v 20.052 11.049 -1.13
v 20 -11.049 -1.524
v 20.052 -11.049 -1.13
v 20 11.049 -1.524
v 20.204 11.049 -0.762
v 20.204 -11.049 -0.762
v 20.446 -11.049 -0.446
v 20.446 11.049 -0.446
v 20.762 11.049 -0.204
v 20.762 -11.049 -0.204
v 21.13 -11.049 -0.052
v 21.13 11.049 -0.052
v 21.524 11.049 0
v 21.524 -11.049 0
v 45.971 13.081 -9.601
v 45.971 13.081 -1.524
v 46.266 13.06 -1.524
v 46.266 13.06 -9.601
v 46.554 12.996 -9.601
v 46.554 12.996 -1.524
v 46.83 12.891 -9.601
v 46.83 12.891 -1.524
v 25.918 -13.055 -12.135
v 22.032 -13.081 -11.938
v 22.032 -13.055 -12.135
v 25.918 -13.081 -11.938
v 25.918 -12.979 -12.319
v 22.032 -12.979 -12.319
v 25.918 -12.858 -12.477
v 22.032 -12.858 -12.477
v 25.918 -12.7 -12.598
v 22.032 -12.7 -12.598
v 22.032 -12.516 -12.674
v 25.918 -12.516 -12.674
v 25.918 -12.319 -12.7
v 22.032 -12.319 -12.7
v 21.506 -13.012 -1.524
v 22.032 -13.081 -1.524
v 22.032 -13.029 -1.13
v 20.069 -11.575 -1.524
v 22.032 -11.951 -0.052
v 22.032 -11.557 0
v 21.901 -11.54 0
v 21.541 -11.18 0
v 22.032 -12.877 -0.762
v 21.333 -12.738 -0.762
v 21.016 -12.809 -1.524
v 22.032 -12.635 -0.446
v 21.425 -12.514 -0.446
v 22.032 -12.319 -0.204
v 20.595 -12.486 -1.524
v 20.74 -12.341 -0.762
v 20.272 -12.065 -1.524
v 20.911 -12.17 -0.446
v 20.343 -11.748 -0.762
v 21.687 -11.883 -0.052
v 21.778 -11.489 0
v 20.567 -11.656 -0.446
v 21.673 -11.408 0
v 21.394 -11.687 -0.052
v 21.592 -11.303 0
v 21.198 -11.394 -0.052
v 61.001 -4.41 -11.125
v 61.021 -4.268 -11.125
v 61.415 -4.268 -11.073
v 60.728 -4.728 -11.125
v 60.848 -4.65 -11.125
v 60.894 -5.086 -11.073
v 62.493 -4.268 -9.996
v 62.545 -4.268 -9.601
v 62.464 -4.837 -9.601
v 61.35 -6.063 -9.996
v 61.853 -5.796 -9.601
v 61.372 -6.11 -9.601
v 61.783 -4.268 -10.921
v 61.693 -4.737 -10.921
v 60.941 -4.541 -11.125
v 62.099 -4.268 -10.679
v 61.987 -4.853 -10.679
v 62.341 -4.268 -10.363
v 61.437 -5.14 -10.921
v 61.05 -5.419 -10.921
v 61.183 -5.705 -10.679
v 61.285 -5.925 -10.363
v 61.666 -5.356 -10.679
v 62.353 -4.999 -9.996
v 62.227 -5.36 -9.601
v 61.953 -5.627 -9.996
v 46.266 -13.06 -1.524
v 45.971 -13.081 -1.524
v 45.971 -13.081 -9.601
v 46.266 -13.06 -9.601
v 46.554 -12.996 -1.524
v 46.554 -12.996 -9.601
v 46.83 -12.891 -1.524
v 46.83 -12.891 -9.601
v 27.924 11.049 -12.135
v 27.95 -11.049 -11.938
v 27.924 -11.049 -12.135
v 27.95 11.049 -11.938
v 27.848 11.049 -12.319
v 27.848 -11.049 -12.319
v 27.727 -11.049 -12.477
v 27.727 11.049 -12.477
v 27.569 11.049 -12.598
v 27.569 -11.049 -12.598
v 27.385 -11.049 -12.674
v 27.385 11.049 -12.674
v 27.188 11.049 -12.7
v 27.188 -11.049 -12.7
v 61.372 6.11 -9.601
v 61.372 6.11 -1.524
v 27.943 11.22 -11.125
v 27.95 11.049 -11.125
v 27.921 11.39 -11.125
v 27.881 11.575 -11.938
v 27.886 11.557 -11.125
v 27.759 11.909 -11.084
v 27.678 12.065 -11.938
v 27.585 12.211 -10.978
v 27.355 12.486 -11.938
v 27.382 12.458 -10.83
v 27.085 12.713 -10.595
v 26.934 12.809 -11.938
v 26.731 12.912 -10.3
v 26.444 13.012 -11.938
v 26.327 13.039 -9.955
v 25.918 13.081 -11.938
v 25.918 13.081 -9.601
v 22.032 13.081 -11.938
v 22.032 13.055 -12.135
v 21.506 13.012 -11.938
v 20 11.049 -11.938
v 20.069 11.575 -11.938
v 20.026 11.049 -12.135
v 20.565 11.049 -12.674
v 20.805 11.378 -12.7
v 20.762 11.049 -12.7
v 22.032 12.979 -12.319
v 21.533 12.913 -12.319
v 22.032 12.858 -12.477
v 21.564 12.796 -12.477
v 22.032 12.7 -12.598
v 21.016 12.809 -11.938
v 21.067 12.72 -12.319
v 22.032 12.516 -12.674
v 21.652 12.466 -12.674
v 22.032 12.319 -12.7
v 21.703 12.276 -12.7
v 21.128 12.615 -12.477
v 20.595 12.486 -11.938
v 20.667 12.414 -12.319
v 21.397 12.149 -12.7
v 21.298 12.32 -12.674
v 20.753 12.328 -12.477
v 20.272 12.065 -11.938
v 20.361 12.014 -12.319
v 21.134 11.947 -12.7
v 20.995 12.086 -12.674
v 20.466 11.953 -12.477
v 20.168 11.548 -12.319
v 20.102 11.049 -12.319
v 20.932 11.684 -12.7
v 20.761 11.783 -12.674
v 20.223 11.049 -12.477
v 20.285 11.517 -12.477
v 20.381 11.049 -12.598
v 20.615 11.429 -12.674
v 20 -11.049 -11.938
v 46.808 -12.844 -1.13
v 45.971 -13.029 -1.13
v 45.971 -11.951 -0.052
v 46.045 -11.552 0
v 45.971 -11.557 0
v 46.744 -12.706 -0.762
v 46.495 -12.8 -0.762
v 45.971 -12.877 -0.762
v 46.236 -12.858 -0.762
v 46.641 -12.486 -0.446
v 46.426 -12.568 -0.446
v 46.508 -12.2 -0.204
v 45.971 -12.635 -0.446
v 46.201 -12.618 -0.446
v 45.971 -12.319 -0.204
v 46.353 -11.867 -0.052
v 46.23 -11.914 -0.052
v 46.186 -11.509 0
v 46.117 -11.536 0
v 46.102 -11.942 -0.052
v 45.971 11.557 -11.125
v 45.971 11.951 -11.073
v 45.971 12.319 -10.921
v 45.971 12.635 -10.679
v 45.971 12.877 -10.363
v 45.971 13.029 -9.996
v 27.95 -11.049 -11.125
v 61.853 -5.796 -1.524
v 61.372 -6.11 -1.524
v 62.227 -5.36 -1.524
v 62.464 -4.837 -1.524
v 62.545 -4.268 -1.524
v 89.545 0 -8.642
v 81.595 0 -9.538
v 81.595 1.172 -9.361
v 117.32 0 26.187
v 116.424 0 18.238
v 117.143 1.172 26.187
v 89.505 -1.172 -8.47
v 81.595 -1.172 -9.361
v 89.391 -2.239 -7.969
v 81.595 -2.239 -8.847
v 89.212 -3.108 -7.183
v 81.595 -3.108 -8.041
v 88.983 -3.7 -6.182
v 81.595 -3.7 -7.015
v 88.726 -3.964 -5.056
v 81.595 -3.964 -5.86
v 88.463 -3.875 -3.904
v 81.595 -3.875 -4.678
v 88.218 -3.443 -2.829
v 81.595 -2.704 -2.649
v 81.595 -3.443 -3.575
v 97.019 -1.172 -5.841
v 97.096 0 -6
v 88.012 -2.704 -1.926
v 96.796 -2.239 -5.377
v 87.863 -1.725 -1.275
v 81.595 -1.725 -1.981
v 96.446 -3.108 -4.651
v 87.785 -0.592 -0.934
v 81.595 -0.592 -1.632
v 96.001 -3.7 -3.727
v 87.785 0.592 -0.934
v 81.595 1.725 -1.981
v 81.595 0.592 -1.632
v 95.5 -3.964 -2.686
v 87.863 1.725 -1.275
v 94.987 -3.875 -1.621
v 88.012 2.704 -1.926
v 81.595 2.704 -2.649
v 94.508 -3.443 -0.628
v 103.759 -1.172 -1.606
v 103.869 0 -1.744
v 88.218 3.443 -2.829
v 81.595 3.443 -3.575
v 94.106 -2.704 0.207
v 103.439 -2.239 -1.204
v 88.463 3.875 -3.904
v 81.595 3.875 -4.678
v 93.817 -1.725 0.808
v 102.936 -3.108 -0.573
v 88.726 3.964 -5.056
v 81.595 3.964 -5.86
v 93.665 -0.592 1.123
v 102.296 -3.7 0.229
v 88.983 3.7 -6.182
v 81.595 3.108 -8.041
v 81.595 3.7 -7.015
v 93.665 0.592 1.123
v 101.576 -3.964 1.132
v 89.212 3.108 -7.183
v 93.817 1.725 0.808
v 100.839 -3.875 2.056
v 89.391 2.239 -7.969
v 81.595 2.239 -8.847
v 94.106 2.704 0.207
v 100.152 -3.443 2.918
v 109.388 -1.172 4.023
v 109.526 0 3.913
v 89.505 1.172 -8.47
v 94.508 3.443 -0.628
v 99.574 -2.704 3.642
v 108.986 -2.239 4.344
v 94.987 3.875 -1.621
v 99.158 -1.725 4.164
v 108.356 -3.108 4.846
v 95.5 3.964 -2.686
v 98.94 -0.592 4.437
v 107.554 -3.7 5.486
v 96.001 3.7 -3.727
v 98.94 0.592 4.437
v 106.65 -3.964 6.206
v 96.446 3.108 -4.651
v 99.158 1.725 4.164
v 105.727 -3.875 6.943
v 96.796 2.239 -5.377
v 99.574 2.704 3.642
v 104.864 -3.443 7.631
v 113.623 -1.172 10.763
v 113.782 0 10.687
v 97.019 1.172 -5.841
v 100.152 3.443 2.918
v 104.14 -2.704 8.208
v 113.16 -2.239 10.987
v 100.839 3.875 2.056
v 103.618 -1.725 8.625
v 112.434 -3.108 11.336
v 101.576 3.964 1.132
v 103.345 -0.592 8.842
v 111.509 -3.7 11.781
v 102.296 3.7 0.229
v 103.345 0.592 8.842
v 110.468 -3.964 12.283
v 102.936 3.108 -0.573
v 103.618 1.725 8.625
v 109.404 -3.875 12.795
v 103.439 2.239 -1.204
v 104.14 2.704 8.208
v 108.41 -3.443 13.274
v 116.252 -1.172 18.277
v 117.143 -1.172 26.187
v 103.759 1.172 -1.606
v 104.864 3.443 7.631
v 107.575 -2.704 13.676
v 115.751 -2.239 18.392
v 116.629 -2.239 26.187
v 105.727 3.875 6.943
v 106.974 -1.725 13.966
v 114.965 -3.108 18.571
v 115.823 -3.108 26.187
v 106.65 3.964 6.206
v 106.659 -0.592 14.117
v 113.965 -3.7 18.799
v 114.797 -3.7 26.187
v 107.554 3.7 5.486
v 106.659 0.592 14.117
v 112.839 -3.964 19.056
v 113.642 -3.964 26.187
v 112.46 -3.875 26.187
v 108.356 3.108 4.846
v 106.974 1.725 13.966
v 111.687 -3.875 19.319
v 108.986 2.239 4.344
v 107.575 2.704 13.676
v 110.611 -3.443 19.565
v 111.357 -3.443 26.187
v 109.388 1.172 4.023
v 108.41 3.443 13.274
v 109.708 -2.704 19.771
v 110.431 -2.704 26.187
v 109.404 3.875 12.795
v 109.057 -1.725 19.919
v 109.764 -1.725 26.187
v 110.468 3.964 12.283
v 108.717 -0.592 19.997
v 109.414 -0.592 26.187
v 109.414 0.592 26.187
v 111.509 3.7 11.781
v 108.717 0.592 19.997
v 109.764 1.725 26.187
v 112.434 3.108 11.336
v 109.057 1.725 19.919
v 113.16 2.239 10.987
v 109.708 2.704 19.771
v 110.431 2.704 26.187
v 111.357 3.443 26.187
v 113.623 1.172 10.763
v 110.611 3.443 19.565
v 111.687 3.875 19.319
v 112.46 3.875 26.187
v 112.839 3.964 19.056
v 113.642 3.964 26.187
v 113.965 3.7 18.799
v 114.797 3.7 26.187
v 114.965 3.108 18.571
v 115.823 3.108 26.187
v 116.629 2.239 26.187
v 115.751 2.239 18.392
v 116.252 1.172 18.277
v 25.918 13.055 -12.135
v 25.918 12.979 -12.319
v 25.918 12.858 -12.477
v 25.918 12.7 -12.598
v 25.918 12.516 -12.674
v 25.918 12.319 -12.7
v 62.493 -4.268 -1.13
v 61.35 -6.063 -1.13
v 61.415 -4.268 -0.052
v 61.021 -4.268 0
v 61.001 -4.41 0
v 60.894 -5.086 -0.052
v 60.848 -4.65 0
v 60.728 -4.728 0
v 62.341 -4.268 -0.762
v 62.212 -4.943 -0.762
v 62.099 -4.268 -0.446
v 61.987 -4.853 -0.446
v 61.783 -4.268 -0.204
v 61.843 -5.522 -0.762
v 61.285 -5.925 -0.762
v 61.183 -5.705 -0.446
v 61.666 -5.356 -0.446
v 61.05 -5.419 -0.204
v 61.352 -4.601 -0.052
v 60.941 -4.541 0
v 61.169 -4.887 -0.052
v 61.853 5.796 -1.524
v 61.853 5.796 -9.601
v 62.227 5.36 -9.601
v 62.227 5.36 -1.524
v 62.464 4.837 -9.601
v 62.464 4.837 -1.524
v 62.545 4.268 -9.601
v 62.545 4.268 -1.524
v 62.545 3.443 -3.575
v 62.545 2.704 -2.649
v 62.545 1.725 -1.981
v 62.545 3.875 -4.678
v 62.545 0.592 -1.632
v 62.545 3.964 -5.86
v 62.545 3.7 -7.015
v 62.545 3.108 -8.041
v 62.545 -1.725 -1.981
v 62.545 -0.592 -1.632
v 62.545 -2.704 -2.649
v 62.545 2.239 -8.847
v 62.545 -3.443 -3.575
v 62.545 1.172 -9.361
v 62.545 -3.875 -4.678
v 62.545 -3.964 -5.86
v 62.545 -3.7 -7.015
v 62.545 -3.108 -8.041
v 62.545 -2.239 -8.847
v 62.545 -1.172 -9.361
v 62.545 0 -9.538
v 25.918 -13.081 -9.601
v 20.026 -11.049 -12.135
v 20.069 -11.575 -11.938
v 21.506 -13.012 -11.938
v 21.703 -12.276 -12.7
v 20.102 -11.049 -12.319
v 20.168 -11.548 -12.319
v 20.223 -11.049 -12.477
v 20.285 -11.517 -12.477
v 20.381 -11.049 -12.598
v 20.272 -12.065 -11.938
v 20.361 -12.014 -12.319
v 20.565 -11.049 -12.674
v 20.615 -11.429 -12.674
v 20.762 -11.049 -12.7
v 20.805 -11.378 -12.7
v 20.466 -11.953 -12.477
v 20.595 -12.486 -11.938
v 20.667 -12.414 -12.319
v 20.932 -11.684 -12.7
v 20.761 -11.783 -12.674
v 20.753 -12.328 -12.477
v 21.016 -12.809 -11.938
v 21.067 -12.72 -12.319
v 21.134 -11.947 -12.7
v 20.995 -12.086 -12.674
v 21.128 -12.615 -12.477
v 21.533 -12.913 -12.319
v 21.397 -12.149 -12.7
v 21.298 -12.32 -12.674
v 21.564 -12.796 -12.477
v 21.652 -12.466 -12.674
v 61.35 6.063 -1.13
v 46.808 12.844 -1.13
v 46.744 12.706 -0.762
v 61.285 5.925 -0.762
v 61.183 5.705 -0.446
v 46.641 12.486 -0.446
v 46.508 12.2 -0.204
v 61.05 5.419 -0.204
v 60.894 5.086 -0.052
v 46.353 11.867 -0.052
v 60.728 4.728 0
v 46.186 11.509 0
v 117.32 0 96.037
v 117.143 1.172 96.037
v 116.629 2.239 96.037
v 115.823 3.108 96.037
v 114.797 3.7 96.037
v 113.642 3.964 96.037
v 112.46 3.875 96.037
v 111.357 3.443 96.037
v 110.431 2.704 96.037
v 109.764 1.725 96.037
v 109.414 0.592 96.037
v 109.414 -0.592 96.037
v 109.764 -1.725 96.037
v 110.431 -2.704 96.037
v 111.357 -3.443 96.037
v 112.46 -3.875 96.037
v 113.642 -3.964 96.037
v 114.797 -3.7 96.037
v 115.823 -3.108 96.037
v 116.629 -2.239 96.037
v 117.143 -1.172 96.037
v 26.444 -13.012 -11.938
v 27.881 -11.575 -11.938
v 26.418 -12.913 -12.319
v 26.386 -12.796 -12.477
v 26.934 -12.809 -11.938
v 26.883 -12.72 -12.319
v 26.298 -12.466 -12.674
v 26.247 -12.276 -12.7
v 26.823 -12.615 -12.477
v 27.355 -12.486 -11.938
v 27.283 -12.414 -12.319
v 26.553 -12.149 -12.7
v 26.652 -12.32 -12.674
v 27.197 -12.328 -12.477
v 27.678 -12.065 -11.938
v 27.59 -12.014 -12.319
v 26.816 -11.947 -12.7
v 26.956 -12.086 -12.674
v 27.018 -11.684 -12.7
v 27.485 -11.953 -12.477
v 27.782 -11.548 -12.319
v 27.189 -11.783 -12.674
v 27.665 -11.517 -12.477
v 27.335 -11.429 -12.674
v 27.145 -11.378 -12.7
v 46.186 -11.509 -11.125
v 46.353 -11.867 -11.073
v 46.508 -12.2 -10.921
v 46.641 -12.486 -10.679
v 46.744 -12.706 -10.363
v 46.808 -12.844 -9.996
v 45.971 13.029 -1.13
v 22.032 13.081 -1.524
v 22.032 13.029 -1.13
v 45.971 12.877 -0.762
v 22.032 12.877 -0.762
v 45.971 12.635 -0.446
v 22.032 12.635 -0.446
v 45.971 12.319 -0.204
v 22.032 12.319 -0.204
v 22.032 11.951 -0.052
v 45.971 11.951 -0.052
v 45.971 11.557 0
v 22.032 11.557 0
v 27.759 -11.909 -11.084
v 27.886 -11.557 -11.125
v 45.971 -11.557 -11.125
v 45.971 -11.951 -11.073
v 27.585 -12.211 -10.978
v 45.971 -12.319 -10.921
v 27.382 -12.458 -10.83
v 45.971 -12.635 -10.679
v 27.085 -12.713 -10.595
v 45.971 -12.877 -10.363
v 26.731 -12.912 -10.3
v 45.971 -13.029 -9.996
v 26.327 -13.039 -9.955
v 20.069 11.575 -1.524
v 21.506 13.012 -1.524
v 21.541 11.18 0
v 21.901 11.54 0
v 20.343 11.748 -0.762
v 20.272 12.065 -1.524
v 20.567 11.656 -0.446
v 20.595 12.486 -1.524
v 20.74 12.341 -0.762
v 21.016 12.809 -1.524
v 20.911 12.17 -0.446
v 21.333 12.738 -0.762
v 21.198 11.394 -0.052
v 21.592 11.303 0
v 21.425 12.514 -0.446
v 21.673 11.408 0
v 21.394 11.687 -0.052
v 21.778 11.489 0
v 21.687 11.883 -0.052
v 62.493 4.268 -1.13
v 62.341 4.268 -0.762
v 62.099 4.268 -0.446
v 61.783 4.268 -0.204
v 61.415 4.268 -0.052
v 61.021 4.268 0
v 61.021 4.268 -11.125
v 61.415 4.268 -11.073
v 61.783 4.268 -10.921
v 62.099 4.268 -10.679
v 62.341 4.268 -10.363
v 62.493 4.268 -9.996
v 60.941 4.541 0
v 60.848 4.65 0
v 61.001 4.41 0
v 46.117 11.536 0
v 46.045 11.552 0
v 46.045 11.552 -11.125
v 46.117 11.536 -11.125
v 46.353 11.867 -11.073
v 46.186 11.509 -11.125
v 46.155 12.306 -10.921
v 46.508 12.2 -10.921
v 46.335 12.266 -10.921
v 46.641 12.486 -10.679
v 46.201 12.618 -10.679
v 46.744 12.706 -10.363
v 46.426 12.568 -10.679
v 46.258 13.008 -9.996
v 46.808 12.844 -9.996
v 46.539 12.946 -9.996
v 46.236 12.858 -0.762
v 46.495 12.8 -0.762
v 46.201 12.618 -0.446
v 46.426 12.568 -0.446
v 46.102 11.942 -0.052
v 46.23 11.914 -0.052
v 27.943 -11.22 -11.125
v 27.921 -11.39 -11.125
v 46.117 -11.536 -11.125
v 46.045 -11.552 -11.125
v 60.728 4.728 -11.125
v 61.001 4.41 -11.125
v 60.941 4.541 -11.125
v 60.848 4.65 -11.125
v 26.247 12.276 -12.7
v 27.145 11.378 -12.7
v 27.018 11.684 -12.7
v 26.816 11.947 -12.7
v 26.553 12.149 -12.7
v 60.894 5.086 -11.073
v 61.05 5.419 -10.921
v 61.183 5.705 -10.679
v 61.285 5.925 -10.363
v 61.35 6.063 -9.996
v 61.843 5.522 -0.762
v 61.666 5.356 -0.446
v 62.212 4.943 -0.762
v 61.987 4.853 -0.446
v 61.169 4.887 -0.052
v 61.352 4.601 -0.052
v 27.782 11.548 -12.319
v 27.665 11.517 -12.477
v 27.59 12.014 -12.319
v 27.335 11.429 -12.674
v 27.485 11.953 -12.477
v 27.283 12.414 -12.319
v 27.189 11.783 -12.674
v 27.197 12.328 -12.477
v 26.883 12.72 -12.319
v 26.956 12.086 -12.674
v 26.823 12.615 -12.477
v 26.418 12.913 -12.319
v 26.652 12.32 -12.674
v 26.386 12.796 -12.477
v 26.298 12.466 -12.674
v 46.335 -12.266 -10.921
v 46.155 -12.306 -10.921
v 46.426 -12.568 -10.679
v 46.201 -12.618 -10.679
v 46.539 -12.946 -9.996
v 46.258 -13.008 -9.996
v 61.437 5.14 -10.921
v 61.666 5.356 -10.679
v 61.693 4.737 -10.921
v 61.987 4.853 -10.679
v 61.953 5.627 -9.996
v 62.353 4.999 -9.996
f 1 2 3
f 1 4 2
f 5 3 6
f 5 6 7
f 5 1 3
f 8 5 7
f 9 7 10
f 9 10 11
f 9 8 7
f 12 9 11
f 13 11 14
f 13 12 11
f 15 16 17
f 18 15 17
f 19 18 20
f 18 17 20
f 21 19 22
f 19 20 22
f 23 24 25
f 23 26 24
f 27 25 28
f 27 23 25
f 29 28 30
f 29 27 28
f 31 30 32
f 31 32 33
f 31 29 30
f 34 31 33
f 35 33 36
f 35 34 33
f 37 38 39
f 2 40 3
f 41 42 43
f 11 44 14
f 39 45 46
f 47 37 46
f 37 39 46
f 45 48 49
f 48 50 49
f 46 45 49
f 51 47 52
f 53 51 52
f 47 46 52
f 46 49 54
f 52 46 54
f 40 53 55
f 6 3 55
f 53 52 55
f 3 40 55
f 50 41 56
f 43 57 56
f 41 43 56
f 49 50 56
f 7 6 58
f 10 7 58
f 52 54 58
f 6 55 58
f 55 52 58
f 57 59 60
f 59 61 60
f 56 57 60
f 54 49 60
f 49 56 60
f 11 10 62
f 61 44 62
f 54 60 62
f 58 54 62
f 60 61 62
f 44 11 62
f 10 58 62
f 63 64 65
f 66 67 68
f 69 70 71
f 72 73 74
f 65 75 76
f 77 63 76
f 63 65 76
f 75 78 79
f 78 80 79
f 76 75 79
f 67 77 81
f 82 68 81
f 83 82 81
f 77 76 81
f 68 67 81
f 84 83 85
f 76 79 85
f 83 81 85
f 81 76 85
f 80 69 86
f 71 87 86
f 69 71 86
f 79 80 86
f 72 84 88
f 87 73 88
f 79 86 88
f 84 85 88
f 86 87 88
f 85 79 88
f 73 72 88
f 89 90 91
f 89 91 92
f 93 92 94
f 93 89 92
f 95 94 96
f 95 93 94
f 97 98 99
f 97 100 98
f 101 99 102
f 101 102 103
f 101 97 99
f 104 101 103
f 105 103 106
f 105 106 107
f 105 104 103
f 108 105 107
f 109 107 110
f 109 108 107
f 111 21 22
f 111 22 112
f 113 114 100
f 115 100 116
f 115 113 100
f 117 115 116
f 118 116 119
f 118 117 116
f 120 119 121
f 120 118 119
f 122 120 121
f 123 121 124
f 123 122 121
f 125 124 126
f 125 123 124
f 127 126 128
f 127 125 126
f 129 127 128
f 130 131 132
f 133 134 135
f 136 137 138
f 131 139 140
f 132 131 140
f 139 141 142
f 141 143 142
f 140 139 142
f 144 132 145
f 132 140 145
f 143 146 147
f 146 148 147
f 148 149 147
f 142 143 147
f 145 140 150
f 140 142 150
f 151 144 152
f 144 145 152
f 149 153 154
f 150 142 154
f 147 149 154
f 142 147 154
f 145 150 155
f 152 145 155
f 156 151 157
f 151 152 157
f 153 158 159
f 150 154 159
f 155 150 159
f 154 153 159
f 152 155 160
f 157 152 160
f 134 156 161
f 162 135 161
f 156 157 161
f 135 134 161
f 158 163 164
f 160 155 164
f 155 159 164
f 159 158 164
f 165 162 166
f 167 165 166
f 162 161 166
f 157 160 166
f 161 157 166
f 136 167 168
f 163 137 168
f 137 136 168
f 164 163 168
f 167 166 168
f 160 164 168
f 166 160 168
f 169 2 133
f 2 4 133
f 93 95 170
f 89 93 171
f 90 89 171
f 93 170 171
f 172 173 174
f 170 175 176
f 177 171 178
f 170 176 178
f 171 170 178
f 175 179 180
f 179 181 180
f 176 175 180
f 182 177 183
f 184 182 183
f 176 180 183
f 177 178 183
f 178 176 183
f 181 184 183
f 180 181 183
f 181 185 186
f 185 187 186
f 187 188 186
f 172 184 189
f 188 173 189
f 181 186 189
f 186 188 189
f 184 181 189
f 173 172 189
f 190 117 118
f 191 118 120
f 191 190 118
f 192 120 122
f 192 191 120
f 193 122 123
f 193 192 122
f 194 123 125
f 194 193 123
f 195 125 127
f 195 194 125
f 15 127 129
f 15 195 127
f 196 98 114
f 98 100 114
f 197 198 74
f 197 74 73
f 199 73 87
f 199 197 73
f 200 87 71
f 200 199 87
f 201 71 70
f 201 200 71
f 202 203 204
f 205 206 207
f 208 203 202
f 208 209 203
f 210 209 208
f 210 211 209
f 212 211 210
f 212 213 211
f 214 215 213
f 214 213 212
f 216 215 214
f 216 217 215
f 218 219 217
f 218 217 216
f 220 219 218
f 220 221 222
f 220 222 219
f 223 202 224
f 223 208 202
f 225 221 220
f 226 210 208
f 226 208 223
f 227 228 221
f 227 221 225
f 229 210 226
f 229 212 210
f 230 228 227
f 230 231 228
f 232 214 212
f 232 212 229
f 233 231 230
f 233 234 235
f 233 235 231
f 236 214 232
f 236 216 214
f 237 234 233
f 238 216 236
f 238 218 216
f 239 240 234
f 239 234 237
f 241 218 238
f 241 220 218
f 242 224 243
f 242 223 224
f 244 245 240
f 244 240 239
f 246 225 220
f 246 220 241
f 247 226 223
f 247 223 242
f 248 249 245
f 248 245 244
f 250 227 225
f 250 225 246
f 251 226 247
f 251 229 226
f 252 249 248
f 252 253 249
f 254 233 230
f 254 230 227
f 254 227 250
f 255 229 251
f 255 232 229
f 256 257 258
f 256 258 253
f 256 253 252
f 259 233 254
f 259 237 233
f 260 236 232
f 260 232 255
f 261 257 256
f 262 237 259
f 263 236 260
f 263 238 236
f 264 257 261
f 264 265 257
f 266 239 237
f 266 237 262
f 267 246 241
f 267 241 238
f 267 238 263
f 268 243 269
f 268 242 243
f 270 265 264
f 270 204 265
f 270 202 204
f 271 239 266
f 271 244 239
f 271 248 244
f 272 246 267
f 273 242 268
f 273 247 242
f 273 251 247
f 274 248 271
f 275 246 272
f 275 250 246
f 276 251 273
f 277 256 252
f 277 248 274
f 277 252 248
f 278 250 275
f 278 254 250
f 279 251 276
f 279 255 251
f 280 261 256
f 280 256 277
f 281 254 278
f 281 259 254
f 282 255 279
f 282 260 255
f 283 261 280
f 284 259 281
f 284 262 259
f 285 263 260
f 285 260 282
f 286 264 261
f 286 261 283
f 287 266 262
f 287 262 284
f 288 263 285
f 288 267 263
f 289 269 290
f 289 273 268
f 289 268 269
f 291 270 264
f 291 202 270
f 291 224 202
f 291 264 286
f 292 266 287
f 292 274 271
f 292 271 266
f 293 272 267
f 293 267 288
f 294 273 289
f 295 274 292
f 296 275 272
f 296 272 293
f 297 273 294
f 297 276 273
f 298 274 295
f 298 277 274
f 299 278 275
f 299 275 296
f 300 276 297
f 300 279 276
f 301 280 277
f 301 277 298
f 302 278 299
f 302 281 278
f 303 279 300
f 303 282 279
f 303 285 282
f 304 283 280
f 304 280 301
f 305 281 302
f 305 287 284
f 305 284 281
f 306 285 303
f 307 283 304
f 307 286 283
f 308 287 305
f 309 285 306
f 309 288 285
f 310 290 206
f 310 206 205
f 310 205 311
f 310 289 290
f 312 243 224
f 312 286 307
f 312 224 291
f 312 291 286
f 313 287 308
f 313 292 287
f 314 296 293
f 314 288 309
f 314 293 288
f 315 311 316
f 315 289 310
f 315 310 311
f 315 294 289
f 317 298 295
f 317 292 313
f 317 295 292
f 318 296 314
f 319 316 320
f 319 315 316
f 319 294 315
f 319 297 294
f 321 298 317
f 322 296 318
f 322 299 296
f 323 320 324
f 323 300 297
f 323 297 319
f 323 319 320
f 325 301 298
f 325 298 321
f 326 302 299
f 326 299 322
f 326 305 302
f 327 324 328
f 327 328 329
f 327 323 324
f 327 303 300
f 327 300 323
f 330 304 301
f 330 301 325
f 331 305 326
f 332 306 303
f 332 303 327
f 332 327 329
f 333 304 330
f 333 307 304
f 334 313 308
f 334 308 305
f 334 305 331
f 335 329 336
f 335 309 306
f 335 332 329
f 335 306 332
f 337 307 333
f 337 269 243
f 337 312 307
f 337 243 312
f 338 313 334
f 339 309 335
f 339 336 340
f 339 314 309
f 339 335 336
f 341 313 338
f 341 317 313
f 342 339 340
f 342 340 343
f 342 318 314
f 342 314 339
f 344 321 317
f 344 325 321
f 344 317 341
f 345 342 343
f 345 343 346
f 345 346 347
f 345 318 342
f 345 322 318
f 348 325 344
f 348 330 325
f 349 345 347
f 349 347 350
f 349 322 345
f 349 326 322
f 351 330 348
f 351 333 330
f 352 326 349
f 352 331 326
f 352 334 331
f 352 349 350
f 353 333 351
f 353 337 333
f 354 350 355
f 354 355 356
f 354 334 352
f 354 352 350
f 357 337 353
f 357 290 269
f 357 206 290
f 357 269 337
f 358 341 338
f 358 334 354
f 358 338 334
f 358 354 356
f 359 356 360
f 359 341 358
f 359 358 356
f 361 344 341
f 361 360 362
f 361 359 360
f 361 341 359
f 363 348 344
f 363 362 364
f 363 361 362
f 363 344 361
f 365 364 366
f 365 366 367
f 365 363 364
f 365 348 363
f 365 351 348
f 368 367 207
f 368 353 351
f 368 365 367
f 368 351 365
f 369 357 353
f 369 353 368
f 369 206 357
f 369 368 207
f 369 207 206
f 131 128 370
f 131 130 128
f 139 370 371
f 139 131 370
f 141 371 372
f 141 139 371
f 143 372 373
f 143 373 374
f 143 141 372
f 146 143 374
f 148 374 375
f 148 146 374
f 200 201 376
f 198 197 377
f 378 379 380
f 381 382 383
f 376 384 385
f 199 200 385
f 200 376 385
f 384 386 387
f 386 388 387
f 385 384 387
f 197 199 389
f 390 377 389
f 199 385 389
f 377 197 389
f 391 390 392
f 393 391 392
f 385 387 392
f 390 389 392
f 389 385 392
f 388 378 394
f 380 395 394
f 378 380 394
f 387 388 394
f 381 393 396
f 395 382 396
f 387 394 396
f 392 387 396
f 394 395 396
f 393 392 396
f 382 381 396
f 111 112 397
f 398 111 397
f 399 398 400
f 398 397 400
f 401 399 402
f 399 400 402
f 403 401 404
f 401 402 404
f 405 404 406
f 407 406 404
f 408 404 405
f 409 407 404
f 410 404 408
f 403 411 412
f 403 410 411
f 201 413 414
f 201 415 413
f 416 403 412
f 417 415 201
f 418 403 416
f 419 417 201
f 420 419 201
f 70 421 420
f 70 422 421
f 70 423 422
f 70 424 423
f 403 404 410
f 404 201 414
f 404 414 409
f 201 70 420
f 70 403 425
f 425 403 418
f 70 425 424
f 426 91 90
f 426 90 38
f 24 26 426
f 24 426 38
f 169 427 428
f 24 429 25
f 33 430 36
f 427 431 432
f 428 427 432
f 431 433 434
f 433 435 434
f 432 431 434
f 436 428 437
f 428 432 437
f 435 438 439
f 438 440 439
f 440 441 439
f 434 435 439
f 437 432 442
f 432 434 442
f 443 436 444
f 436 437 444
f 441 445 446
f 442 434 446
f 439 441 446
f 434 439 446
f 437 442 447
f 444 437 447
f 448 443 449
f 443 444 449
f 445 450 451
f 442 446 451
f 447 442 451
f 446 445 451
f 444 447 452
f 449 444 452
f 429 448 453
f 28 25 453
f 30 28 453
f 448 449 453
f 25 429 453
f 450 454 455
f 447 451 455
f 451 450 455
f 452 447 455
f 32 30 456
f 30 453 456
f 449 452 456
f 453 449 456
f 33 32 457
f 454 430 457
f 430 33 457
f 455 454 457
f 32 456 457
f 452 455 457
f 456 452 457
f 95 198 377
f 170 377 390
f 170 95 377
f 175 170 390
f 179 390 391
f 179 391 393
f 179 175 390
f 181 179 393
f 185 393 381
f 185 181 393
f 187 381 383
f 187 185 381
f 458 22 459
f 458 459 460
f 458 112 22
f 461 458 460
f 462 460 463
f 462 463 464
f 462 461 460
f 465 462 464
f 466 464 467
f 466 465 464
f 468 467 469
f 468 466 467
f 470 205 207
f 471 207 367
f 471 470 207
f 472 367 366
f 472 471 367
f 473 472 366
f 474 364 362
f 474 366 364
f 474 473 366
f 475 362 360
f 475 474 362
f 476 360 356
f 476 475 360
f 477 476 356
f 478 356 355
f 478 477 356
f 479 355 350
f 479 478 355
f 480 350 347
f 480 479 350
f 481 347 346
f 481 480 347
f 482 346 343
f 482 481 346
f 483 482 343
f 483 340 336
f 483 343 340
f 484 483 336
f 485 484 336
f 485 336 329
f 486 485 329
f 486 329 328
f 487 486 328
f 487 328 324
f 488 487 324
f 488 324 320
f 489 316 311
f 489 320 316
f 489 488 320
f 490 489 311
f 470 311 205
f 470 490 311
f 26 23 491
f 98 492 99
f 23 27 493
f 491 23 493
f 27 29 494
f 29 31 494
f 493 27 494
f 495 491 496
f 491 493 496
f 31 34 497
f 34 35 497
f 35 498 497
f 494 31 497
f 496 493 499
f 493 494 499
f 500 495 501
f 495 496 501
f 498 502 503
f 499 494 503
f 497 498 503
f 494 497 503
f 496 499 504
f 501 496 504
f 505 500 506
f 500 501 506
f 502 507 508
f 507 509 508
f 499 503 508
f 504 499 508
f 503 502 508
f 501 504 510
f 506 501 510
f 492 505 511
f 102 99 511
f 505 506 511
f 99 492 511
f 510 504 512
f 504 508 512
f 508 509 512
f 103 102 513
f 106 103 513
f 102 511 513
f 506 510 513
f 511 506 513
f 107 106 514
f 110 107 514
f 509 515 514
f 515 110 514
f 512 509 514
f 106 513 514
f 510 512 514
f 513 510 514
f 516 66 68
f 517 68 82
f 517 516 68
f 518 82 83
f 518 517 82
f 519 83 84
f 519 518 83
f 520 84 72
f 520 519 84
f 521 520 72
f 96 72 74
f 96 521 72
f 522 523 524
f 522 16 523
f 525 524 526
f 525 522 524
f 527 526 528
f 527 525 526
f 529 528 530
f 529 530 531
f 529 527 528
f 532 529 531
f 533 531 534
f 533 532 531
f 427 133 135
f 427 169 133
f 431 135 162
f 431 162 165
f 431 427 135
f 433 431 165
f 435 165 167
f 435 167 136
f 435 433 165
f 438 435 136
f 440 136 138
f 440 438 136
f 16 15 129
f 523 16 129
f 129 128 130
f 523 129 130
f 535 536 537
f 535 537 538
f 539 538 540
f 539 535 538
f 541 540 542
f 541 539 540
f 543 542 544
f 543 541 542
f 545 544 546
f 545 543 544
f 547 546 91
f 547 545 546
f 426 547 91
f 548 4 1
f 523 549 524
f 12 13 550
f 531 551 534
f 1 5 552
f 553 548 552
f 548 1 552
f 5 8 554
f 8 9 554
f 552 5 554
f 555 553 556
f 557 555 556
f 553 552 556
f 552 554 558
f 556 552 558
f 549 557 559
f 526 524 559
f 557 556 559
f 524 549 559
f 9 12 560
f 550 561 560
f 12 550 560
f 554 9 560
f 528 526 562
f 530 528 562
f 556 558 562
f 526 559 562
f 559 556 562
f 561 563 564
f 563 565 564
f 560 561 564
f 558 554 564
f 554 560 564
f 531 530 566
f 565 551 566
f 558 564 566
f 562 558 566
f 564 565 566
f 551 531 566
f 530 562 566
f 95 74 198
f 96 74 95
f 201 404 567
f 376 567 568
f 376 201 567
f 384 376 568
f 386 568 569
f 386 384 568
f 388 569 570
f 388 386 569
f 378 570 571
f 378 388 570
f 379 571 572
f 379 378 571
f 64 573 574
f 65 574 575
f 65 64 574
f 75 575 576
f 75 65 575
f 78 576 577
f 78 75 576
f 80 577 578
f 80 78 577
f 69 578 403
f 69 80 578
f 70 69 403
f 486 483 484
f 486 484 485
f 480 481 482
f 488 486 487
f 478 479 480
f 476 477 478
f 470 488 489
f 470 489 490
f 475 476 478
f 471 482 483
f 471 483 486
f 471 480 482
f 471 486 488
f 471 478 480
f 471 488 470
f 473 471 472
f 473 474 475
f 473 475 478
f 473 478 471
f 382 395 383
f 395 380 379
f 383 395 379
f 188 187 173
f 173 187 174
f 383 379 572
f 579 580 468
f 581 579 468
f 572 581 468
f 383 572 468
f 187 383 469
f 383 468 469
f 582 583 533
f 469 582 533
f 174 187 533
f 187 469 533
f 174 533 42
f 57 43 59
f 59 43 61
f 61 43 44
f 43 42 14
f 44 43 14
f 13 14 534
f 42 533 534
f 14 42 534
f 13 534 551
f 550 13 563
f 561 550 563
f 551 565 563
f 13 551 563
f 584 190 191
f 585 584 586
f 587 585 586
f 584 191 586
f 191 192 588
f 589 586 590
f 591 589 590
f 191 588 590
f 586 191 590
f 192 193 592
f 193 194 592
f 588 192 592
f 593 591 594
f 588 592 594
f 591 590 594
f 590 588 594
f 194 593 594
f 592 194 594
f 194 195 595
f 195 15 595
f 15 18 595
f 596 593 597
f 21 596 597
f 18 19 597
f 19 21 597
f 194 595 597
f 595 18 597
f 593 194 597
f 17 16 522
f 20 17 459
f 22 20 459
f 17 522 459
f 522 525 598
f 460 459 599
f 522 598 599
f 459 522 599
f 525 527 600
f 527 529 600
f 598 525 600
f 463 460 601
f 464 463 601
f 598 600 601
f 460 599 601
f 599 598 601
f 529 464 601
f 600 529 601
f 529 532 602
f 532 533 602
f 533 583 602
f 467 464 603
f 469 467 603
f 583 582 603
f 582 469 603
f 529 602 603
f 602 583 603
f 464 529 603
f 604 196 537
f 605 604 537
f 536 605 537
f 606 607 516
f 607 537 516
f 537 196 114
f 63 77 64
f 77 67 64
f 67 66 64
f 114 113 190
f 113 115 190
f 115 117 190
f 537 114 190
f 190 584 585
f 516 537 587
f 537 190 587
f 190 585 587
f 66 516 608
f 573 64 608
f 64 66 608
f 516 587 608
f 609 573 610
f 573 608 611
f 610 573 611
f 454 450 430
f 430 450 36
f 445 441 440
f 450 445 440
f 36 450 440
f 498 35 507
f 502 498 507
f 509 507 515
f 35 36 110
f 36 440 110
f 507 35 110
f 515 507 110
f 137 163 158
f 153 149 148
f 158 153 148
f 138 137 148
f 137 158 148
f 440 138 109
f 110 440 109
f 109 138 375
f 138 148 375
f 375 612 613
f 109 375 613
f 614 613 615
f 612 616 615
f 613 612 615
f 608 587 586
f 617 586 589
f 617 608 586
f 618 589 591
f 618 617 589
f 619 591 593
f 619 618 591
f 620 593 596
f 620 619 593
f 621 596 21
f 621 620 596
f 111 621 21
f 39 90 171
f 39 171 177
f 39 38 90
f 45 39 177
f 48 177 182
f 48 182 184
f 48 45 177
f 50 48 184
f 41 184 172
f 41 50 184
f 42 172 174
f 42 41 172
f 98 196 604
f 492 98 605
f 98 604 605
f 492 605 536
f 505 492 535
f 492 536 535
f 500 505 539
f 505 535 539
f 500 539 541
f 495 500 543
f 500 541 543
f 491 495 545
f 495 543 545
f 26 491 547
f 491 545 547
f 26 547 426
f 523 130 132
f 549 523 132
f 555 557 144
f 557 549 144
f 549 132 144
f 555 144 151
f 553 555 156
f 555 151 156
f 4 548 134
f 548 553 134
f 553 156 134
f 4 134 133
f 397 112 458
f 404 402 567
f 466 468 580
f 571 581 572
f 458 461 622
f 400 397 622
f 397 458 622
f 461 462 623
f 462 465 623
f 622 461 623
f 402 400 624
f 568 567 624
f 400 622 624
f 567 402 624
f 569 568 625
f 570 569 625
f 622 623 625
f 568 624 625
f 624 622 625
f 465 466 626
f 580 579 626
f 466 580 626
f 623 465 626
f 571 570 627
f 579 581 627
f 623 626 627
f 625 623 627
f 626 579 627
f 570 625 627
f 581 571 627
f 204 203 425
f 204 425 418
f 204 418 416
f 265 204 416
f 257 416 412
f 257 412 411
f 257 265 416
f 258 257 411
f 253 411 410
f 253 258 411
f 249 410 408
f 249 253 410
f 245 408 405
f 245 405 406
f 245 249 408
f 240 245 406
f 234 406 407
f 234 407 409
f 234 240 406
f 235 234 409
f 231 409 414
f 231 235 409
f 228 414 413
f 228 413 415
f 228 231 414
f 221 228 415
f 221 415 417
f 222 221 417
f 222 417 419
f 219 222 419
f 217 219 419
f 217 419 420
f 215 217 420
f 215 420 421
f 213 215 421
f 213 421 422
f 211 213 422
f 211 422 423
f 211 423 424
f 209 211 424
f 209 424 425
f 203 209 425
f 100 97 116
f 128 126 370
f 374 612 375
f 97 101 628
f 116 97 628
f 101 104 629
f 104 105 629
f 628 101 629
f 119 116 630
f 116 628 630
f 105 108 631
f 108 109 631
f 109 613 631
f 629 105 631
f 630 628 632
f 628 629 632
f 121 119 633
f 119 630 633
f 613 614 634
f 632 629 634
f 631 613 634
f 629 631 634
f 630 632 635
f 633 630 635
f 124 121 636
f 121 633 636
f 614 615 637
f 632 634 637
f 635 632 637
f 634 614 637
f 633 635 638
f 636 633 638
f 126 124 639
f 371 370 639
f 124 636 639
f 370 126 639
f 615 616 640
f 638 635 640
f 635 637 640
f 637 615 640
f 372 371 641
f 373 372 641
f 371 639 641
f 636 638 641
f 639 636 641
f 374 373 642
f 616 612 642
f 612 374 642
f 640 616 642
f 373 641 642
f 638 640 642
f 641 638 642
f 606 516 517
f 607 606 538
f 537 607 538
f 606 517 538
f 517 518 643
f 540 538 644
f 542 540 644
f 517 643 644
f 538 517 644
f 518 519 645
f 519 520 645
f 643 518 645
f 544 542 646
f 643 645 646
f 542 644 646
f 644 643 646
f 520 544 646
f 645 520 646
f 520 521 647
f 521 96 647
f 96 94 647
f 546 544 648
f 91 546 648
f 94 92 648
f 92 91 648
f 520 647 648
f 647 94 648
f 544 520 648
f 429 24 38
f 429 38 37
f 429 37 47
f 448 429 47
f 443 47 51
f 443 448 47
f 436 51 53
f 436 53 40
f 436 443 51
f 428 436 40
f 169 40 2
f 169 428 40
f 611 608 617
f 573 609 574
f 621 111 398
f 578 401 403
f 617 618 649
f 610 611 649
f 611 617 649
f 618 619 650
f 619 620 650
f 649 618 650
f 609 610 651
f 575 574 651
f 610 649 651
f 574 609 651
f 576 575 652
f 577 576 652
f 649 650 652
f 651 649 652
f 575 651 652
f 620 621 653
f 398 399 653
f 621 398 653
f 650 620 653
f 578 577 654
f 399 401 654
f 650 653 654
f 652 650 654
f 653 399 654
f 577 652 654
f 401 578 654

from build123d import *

# Parameters (mm, degrees)
BOSS_EXTRUDE1_DEPTH = 13.081
CUT_EXTRUDE1_START  = -11.1252
CUT_EXTRUDE1_DEPTH  = 11.1252
FILLET1_R           = 2.032
FILLET2_R           = 0.762
FILLET6_R           = 1.524
SKETCH6_R           = 3.9751


# Read off the part's stored shape, not the designer's step: Cut-Extrude1
with BuildPart() as part:
    # Sketch1 → Boss-Extrude1 (new, symmetric)
    with BuildSketch(Plane(origin=(0, 0, 0), x_dir=(1, 0, 0), z_dir=(0, 1, 0))):
        Polygon((27.9502, 12.7), (27.9502, 11.1252), (63.561, 11.1252), (63.561, 0), (20, 0), (20, 12.7), align=None)
    extrude(amount=BOSS_EXTRUDE1_DEPTH, both=True)

    # Cut-Extrude1 outline → Cut-Extrude1 (cut)
    with BuildSketch(Plane.XY.offset(CUT_EXTRUDE1_START)):
        Polygon((62.545, 5.5626), (62.545, -5.5626), (46.421739169, -13.081), (63.561, -13.081), (63.561, 13.081), (46.421739169, 13.081), align=None)
    extrude(amount=CUT_EXTRUDE1_DEPTH, mode=Mode.SUBTRACT)

    # Fillet1
    fillet1_edges = [part.edges().sort_by_distance(p)[0] for p in [
        (27.9502, 13.081, -11.9126),
        (46.421739169, -13.081, -5.5626),
        (46.421739169, 13.081, -5.5626),
        (62.545, -5.5626, -5.5626),
        (62.545, 5.5626, -5.5626),
        (20, 13.081, -6.35),
        (27.9502, -13.081, -11.9126),
        (20, -13.081, -6.35),
    ]]
    fillet(fillet1_edges, radius=FILLET1_R)

    # Fillet2
    fillet2_edges = [part.edges().sort_by_distance(p)[0] for p in [
        (23.9751, -13.081, -12.7),
        (23.9751, 13.081, -12.7),
        (27.9502, 0, -12.7),
        (20, 0, -12.7),
        (20.595159021, -12.485840979, -12.7),
        (20.595159021, 12.485840979, -12.7),
        (27.355040979, 12.485840979, -12.7),
        (27.355040979, -12.485840979, -12.7),
    ]]
    fillet(fillet2_edges, radius=FILLET2_R)

    # Fillet6
    fillet6_edges = [part.edges().sort_by_distance(p)[0] for p in [
        (35.944727807, -13.081, -11.1252),
        (34.001627807, -13.081, 0),
        (54.100888115, 9.500154038, 0),
        (34.001627807, 13.081, 0),
        (20, 0, 0),
        (54.100888115, -9.500154038, 0),
        (62.545, 0, 0),
        (62.226771418, 5.359866034, 0),
        (62.226771418, -5.359866034, 0),
        (20.595159021, -12.485840979, 0),
        (20.595159021, 12.485840979, 0),
        (46.41106091, 13.032833486, 0),
        (46.41106091, -13.032833486, 0),
        (54.100888115, -9.500154038, -11.1252),
        (54.100888115, 9.500154038, -11.1252),
        (62.545, 0, -11.1252),
        (35.944727807, 13.081, -11.1252),
        (62.226771418, 5.359866034, -11.1252),
        (62.226771418, -5.359866034, -11.1252),
        (46.41106091, 13.032833486, -11.1252),
        (46.41106091, -13.032833486, -11.1252),
    ]]
    fillet(fillet6_edges, radius=FILLET6_R)

    # Sweep1: sweep along a path in Sketch4
    with BuildLine(Plane(origin=(0, 0, 0), x_dir=(1, 0, 0), z_dir=(0, 1, 0))) as sweep1_path:
        Line((62.545, 5.5626), (81.595, 5.5626))
        ThreePointArc((81.595, 5.5626), (104.045640303, -3.736759697), (113.345, -26.1874))
        Line((113.345, -26.1874), (113.345, -96.0374))
    # Sketch6 → Sweep1 (sweep)
    with BuildSketch(Plane(origin=(62.545, 0, 0), x_dir=(0, 0, -1), z_dir=(1, 0, 0))):
        with Locations((5.5626, 0)):
            Circle(SKETCH6_R)
    sweep(path=sweep1_path.line)


solid = part.part
